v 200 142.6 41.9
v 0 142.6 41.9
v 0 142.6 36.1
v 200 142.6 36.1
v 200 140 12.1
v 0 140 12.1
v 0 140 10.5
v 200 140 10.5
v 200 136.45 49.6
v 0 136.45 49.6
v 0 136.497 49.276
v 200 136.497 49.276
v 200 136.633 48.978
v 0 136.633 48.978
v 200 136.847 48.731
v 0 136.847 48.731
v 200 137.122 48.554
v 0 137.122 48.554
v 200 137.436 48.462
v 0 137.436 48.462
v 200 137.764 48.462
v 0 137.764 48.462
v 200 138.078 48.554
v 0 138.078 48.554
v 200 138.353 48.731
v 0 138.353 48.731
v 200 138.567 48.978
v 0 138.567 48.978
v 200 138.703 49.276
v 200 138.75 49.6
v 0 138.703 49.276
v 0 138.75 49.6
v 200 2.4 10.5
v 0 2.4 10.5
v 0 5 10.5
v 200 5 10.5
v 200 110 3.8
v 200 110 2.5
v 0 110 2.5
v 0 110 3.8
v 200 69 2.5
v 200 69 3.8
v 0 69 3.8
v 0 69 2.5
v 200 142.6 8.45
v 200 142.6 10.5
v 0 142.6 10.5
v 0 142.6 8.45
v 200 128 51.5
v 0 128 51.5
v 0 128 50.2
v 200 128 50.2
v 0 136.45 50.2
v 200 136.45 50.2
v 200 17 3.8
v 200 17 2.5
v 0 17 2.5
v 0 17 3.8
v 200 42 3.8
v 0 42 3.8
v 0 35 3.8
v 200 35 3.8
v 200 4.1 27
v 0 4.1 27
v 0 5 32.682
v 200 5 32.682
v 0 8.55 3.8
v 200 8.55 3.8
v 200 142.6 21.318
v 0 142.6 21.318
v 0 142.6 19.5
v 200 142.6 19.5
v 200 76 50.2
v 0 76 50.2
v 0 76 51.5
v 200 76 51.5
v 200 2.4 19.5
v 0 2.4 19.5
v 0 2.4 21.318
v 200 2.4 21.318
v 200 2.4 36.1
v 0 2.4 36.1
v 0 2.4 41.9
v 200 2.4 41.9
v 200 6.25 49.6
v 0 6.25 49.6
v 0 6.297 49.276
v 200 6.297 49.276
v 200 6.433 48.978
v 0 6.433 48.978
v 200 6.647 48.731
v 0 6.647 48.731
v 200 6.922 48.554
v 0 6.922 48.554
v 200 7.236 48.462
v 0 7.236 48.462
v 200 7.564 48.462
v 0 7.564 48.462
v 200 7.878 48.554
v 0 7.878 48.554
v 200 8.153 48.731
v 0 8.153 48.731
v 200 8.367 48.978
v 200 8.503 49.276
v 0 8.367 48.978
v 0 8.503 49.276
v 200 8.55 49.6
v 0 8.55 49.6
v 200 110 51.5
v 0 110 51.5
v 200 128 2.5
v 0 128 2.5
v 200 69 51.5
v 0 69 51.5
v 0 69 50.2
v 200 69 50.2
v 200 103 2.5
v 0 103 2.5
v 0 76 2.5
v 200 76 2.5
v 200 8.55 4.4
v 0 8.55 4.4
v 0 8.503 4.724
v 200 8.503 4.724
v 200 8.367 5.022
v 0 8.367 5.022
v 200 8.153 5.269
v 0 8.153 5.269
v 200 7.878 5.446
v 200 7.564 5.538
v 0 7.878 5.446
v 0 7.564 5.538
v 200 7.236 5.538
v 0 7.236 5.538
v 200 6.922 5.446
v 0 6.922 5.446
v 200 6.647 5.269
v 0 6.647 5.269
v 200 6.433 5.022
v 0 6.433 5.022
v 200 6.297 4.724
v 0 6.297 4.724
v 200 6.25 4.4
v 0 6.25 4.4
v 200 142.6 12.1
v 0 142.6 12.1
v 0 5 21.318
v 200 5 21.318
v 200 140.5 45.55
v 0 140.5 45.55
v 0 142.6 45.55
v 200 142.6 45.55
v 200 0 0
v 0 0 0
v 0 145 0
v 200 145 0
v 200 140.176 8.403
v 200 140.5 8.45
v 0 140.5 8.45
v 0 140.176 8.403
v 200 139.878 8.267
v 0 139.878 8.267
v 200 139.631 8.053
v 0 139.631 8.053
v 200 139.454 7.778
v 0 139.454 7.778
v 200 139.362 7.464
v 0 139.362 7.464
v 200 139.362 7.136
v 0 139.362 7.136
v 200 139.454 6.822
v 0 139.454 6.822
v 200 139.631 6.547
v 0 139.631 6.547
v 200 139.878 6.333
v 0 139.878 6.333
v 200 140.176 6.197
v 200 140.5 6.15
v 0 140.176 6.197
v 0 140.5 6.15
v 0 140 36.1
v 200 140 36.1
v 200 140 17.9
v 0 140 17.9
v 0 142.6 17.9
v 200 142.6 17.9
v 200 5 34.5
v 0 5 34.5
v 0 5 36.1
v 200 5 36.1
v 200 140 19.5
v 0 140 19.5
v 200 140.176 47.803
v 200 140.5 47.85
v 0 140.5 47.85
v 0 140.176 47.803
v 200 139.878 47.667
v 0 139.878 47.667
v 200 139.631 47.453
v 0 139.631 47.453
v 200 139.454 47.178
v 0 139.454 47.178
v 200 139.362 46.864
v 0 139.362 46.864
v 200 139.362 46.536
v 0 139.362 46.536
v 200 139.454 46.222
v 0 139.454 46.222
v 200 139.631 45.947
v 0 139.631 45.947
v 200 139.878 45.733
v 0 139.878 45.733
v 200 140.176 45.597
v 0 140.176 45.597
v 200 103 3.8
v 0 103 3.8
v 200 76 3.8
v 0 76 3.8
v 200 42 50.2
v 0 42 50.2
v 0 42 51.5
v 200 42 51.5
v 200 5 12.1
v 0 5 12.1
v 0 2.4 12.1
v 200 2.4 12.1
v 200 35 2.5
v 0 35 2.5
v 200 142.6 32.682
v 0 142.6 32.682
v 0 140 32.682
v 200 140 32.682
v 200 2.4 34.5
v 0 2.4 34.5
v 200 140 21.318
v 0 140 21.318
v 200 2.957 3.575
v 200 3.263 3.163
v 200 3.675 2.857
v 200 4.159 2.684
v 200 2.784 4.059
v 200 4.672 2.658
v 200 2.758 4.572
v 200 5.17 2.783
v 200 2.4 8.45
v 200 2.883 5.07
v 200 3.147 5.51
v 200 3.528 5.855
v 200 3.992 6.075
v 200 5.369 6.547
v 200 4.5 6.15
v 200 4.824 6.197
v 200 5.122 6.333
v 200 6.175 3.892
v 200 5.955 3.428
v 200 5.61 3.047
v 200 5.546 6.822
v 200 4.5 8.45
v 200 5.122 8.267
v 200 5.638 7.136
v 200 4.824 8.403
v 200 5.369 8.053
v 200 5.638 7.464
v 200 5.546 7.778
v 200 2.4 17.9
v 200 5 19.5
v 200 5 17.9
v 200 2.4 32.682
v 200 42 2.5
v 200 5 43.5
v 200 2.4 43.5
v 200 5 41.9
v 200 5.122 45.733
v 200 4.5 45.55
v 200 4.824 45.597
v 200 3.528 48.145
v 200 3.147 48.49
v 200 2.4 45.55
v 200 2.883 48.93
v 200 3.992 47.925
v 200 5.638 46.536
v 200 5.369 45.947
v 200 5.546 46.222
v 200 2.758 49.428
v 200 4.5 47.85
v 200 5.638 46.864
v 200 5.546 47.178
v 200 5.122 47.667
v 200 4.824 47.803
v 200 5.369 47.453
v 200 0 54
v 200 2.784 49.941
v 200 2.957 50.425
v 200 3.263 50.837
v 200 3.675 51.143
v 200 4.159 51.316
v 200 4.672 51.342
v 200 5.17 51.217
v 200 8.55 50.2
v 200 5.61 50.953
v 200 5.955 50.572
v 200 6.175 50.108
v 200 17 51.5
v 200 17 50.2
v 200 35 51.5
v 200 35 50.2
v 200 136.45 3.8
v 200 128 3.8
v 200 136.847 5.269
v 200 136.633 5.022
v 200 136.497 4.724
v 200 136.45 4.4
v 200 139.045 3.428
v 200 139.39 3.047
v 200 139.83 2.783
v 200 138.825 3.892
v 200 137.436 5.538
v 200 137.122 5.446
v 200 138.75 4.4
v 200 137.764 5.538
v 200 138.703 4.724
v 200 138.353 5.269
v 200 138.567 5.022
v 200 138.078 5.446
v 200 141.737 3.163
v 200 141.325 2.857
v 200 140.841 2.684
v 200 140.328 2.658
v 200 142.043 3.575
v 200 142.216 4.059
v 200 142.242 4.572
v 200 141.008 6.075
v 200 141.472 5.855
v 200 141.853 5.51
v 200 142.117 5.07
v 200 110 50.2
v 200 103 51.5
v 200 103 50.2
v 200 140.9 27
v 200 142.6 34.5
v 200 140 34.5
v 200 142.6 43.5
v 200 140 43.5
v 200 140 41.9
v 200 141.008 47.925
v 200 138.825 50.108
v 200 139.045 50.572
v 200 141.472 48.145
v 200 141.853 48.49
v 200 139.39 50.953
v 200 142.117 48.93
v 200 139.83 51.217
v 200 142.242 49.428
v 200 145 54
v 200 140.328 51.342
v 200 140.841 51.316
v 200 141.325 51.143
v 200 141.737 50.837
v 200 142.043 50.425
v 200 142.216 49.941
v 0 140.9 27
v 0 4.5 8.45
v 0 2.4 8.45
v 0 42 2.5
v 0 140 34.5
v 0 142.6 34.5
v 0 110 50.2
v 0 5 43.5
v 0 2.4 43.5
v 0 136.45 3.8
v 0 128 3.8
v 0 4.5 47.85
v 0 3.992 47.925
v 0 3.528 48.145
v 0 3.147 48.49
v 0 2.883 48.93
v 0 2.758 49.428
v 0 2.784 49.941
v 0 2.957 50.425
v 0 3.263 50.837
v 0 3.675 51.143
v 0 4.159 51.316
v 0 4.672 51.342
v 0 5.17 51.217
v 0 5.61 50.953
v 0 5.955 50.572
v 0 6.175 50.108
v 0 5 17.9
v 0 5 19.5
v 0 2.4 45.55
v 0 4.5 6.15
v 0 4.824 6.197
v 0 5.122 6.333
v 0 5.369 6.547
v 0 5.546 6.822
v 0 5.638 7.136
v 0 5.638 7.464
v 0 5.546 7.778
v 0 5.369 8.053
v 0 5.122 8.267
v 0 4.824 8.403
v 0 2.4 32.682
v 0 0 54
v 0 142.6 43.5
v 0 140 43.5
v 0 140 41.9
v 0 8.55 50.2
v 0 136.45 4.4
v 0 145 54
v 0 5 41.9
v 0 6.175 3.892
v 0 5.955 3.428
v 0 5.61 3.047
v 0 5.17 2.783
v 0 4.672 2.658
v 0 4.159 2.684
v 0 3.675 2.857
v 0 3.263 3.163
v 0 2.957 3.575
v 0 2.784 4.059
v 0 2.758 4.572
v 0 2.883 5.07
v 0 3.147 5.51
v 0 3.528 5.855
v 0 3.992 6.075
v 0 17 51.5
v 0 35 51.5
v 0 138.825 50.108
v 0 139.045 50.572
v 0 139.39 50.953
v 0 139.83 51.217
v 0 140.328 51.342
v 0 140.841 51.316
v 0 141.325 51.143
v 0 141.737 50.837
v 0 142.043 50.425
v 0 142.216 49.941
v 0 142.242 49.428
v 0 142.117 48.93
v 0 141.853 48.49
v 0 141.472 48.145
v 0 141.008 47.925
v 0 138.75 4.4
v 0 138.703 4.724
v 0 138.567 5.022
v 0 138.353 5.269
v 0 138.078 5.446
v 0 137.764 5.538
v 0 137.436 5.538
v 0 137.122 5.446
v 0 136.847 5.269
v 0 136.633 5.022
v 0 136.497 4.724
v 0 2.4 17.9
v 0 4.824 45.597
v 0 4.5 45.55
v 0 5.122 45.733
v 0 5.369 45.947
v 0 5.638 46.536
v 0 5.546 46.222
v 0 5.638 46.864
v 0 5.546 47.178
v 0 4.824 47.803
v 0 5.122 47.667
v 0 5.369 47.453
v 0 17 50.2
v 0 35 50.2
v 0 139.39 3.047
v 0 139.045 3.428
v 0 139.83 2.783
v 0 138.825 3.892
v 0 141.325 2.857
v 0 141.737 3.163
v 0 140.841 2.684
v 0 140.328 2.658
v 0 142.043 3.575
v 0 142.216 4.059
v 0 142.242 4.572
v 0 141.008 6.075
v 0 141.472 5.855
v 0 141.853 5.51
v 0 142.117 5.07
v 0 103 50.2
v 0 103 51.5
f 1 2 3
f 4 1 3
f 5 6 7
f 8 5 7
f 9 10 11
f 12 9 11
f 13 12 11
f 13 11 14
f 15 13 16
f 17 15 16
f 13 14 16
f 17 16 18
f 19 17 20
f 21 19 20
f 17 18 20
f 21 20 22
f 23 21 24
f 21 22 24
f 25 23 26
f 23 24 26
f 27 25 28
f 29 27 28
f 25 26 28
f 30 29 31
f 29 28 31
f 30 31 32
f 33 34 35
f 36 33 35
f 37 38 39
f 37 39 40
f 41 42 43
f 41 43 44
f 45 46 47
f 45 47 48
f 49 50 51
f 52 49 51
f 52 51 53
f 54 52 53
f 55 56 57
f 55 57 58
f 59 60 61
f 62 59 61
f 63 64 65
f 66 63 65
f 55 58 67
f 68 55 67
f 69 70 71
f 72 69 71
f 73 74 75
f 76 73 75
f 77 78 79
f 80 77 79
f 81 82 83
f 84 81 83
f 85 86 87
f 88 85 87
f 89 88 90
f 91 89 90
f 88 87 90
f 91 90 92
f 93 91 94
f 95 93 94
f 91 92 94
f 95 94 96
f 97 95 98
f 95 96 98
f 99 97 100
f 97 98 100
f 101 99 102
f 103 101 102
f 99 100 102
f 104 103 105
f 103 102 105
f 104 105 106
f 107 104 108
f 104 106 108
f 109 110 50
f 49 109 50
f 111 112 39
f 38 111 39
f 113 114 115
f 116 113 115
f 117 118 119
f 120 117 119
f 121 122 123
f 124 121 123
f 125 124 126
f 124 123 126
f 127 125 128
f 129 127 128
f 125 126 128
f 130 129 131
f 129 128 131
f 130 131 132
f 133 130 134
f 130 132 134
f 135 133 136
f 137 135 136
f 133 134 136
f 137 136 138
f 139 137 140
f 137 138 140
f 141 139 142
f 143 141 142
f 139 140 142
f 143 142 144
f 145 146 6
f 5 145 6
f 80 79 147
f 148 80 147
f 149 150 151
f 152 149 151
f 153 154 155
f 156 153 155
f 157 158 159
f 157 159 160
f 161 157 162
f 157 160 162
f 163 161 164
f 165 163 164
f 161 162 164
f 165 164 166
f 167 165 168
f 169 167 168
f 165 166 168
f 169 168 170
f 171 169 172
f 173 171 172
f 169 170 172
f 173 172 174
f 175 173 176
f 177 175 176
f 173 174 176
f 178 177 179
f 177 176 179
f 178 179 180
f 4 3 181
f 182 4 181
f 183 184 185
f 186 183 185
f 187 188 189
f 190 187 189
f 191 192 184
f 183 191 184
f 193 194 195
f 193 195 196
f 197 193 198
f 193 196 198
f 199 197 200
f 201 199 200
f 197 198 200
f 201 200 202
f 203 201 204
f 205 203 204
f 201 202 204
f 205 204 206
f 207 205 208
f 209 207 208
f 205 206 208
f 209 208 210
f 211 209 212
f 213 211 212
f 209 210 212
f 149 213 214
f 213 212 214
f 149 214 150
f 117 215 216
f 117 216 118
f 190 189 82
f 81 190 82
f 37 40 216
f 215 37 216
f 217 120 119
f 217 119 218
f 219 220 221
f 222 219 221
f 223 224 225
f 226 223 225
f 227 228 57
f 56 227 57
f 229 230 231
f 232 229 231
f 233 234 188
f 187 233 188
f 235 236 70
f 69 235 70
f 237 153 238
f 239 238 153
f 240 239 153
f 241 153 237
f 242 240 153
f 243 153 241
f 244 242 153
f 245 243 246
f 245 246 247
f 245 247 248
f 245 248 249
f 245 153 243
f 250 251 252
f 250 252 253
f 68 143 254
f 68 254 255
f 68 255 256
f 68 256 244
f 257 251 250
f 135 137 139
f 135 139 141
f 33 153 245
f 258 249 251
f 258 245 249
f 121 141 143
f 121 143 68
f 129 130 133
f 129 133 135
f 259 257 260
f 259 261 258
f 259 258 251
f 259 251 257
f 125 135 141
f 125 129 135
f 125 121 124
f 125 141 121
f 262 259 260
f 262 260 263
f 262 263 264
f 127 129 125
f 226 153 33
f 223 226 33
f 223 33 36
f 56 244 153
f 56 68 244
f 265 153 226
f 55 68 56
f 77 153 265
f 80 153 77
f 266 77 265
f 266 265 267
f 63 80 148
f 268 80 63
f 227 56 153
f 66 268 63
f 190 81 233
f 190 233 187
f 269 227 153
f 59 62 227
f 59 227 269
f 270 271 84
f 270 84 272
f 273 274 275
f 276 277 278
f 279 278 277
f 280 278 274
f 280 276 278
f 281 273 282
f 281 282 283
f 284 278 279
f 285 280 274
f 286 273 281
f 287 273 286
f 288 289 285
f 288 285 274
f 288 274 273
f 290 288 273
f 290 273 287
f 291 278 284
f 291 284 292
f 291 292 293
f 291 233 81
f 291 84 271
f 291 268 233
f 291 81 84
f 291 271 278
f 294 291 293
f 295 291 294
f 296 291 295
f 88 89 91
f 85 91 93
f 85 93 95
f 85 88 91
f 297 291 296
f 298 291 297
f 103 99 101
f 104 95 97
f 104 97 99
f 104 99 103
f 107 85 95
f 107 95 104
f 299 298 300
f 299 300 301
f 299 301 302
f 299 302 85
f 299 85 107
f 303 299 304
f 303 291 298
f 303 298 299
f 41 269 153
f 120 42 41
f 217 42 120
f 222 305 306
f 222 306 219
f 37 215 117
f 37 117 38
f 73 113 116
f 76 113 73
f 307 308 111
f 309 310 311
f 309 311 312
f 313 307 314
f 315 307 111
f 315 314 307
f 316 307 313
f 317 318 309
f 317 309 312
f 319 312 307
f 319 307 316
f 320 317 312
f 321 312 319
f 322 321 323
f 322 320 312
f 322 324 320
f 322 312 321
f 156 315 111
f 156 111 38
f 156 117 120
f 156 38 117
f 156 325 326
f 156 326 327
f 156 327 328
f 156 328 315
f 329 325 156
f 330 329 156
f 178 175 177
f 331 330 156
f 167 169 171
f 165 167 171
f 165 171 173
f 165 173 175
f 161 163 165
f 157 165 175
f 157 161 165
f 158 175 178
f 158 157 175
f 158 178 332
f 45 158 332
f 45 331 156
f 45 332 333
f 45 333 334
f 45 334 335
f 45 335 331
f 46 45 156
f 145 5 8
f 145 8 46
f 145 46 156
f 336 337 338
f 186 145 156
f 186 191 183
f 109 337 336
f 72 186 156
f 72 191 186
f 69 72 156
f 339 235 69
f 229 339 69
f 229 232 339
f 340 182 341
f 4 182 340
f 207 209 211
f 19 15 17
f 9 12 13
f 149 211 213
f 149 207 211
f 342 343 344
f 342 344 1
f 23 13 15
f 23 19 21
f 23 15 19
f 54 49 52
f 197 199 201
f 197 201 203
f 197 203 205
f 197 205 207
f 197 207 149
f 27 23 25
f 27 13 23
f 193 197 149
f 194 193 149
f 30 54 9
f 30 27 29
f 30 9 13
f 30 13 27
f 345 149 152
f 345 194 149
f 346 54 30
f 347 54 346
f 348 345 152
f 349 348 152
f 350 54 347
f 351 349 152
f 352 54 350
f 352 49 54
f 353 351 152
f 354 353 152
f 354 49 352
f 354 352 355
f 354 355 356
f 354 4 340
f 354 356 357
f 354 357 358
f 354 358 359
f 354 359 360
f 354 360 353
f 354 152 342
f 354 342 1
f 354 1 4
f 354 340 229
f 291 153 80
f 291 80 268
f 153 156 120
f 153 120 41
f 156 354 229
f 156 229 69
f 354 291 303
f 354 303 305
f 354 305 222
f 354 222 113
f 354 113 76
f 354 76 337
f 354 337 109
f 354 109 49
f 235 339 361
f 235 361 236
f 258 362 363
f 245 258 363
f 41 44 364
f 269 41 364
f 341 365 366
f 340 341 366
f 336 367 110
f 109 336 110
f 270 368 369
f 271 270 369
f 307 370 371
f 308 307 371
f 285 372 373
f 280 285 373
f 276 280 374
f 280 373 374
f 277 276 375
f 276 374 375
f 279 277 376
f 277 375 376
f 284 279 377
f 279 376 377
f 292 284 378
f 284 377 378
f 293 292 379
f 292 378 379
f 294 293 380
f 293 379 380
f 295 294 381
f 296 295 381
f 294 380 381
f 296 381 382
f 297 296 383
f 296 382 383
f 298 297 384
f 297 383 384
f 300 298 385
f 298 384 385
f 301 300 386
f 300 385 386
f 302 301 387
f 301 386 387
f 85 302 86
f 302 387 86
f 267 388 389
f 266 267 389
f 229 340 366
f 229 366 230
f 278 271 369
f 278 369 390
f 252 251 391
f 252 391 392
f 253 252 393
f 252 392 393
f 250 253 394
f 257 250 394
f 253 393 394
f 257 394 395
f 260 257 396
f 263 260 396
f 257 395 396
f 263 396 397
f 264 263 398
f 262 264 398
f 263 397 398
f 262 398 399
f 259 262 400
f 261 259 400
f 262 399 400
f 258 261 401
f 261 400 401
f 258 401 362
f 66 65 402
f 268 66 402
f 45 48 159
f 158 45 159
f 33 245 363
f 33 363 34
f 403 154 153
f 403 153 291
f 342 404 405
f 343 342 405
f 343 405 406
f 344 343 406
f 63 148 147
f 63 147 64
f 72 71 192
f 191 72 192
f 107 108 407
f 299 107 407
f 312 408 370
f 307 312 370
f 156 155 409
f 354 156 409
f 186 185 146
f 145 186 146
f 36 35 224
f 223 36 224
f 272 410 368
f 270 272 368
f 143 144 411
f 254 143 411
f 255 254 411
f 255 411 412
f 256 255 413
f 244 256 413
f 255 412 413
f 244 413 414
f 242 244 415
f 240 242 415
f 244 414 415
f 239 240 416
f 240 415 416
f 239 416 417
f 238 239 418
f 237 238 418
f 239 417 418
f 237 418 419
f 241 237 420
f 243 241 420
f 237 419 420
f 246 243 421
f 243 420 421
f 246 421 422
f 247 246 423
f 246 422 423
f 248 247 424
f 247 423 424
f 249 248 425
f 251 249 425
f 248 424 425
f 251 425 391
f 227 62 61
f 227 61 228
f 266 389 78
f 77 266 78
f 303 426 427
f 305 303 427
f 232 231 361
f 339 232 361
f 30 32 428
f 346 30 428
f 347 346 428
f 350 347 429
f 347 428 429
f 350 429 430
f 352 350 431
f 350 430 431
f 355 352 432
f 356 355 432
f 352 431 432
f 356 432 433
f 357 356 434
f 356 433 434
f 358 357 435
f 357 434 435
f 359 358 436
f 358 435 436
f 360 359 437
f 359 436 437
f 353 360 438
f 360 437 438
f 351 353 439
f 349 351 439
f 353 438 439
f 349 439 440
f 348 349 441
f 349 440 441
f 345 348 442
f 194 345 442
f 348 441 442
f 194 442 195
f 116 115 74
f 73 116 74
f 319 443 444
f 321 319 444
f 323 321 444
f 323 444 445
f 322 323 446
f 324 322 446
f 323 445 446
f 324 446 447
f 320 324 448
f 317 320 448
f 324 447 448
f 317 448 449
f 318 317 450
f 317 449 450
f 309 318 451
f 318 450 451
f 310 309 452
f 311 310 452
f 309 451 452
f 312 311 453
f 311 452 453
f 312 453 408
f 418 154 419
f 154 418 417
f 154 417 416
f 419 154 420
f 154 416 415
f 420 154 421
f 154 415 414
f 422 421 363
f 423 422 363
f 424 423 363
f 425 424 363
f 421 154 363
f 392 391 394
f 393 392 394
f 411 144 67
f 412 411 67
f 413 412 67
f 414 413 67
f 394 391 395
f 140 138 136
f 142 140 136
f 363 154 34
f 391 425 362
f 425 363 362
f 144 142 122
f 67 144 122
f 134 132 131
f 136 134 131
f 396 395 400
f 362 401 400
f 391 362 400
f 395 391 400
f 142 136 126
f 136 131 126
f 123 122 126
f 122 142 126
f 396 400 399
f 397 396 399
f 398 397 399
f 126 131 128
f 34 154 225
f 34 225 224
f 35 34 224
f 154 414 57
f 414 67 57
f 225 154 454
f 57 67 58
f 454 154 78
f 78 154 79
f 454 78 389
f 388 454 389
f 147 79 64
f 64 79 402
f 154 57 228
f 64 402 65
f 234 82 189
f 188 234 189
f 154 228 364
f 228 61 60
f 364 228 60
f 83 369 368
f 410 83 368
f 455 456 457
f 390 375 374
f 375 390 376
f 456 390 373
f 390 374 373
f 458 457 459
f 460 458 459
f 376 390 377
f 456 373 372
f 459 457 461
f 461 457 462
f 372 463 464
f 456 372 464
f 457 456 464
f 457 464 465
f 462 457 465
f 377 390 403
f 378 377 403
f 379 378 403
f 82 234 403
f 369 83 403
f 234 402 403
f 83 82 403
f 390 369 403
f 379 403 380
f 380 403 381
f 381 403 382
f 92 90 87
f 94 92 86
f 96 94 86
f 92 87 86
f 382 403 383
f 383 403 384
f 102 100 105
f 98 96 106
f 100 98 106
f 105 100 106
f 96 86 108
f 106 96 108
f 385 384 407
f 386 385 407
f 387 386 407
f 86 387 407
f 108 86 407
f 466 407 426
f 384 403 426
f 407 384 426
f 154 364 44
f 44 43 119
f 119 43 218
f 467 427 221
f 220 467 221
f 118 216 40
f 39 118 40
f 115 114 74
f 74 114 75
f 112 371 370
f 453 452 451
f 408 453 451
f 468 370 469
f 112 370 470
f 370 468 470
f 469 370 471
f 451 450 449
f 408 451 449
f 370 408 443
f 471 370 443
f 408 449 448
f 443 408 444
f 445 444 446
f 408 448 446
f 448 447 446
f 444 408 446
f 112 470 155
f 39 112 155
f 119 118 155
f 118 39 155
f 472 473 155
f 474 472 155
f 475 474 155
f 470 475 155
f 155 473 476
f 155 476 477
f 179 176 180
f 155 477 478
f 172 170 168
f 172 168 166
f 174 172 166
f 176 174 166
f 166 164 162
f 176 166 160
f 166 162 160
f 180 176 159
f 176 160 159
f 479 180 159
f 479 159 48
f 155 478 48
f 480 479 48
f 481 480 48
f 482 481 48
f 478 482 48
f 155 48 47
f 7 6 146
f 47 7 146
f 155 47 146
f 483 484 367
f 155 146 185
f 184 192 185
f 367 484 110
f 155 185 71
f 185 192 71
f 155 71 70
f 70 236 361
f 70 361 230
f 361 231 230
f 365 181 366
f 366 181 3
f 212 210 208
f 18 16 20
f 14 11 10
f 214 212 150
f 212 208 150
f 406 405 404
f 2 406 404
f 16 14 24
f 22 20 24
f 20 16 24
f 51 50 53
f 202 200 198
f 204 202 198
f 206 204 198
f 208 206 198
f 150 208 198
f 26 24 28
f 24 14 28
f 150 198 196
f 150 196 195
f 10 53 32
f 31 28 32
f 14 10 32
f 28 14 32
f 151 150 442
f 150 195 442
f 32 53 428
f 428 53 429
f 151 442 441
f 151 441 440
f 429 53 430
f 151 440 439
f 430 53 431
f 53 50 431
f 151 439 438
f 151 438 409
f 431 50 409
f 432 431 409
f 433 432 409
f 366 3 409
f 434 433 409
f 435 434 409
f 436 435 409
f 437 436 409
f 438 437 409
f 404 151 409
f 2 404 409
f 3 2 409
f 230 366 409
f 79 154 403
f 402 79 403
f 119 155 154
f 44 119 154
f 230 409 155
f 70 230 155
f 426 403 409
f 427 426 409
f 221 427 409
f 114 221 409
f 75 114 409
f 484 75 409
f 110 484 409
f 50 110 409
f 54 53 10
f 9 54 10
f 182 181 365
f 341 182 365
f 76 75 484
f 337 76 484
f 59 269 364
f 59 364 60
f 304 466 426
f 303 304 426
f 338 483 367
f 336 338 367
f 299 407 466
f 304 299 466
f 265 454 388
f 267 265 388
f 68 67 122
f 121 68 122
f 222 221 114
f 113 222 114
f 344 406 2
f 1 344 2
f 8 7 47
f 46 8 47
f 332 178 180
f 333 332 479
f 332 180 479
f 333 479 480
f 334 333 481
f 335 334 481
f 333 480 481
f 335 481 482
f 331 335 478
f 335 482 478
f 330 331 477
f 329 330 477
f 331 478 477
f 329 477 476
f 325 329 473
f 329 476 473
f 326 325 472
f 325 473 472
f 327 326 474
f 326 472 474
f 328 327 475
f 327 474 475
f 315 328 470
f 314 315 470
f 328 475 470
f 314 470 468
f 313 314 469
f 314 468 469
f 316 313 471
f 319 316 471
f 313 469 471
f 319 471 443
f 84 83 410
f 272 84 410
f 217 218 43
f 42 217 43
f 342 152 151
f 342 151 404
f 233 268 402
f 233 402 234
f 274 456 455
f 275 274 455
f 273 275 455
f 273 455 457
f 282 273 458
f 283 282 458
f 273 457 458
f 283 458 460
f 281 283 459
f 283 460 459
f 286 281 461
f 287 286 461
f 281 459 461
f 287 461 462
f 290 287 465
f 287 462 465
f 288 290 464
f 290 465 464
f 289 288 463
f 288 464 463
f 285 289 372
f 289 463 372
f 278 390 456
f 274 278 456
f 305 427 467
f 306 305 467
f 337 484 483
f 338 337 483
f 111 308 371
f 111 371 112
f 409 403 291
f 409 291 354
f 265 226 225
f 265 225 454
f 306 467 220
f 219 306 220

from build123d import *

# Parameters (mm, degrees)
F0_W     = 145
F0_H     = 54
F1_DEPTH = 200


with BuildPart() as f1:
    # F0 (on Right) → F1 (new body)
    with BuildSketch(Plane.YZ):
        with Locations((72.5, 27)):
            Rectangle(F0_W, F0_H)
        with BuildLine():
            Line((69, 50.2), (72.5, 50.2))
            Line((72.5, 50.2), (76, 50.2))
            Line((76, 50.2), (76, 51.5))
            Line((76, 51.5), (103, 51.5))
            Line((103, 51.5), (103, 50.2))
            Line((103, 50.2), (110, 50.2))
            Line((110, 50.2), (110, 51.5))
            Line((110, 51.5), (128, 51.5))
            Line((128, 51.5), (128, 50.2))
            Line((128, 50.2), (136.45, 50.2))
            Line((136.45, 50.2), (136.45, 49.6))
            ThreePointArc((136.45, 49.6), (137.6, 48.45), (138.75, 49.6))
            ThreePointArc((138.75, 49.6), (141.737437, 50.837437), (140.5, 47.85))
            ThreePointArc((140.5, 47.85), (139.35, 46.7), (140.5, 45.55))
            Line((140.5, 45.55), (142.6, 45.55))
            Line((142.6, 45.55), (142.6, 43.5))
            Line((142.6, 43.5), (140, 43.5))
            Line((140, 43.5), (140, 41.9))
            Line((140, 41.9), (142.6, 41.9))
            Line((142.6, 41.9), (142.6, 36.1))
            Line((142.6, 36.1), (140, 36.1))
            Line((140, 36.1), (140, 34.5))
            Line((140, 34.5), (142.6, 34.5))
            Line((142.6, 34.5), (142.6, 32.682376))
            Line((142.6, 32.682376), (140, 32.682376))
            Line((140, 32.682376), (140.9, 27))
            Line((140.9, 27), (140, 21.317624))
            Line((140, 21.317624), (142.6, 21.317624))
            Line((142.6, 21.317624), (142.6, 19.5))
            Line((142.6, 19.5), (140, 19.5))
            Line((140, 19.5), (140, 17.9))
            Line((140, 17.9), (142.6, 17.9))
            Line((142.6, 17.9), (142.6, 12.1))
            Line((142.6, 12.1), (140, 12.1))
            Line((140, 12.1), (140, 10.5))
            Line((140, 10.5), (142.6, 10.5))
            Line((142.6, 10.5), (142.6, 8.45))
            Line((142.6, 8.45), (140.5, 8.45))
            ThreePointArc((140.5, 8.45), (139.35, 7.3), (140.5, 6.15))
            ThreePointArc((140.5, 6.15), (141.737437, 3.162563), (138.75, 4.4))
            ThreePointArc((138.75, 4.4), (137.6, 5.55), (136.45, 4.4))
            Line((136.45, 4.4), (136.45, 3.8))
            Line((136.45, 3.8), (128, 3.8))
            Line((128, 3.8), (128, 2.5))
            Line((128, 2.5), (110, 2.5))
            Line((110, 2.5), (110, 3.8))
            Line((110, 3.8), (103, 3.8))
            Line((103, 3.8), (103, 2.5))
            Line((103, 2.5), (76, 2.5))
            Line((76, 2.5), (76, 3.8))
            Line((76, 3.8), (72.5, 3.8))
            Line((72.5, 3.8), (69, 3.8))
            Line((69, 3.8), (69, 2.5))
            Line((69, 2.5), (42, 2.5))
            Line((42, 2.5), (42, 3.8))
            Line((42, 3.8), (35, 3.8))
            Line((35, 3.8), (35, 2.5))
            Line((35, 2.5), (17, 2.5))
            Line((17, 2.5), (17, 3.8))
            Line((17, 3.8), (8.55, 3.8))
            Line((8.55, 3.8), (8.55, 4.4))
            ThreePointArc((8.55, 4.4), (7.4, 5.55), (6.25, 4.4))
            ThreePointArc((6.25, 4.4), (3.262563, 3.162563), (4.5, 6.15))
            ThreePointArc((4.5, 6.15), (5.65, 7.3), (4.5, 8.45))
            Line((4.5, 8.45), (2.4, 8.45))
            Line((2.4, 8.45), (2.4, 10.5))
            Line((2.4, 10.5), (5, 10.5))
            Line((5, 10.5), (5, 12.1))
            Line((5, 12.1), (2.4, 12.1))
            Line((2.4, 12.1), (2.4, 17.9))
            Line((2.4, 17.9), (5, 17.9))
            Line((5, 17.9), (5, 19.5))
            Line((5, 19.5), (2.4, 19.5))
            Line((2.4, 19.5), (2.4, 21.317624))
            Line((2.4, 21.317624), (5, 21.317624))
            Line((5, 21.317624), (4.1, 27))
            Line((4.1, 27), (5, 32.682376))
            Line((5, 32.682376), (2.4, 32.682376))
            Line((2.4, 32.682376), (2.4, 34.5))
            Line((2.4, 34.5), (5, 34.5))
            Line((5, 34.5), (5, 36.1))
            Line((5, 36.1), (2.4, 36.1))
            Line((2.4, 36.1), (2.4, 41.9))
            Line((2.4, 41.9), (5, 41.9))
            Line((5, 41.9), (5, 43.5))
            Line((5, 43.5), (2.4, 43.5))
            Line((2.4, 43.5), (2.4, 45.55))
            Line((2.4, 45.55), (4.5, 45.55))
            ThreePointArc((4.5, 45.55), (5.65, 46.7), (4.5, 47.85))
            ThreePointArc((4.5, 47.85), (3.262563, 50.837437), (6.25, 49.6))
            ThreePointArc((6.25, 49.6), (7.4, 48.45), (8.55, 49.6))
            Line((8.55, 49.6), (8.55, 50.2))
            Line((8.55, 50.2), (17, 50.2))
            Line((17, 50.2), (17, 51.5))
            Line((17, 51.5), (35, 51.5))
            Line((35, 51.5), (35, 50.2))
            Line((35, 50.2), (42, 50.2))
            Line((42, 50.2), (42, 51.5))
            Line((42, 51.5), (69, 51.5))
            Line((69, 51.5), (69, 50.2))
        make_face(mode=Mode.SUBTRACT)
    extrude(amount=F1_DEPTH)


solid = f1.part
